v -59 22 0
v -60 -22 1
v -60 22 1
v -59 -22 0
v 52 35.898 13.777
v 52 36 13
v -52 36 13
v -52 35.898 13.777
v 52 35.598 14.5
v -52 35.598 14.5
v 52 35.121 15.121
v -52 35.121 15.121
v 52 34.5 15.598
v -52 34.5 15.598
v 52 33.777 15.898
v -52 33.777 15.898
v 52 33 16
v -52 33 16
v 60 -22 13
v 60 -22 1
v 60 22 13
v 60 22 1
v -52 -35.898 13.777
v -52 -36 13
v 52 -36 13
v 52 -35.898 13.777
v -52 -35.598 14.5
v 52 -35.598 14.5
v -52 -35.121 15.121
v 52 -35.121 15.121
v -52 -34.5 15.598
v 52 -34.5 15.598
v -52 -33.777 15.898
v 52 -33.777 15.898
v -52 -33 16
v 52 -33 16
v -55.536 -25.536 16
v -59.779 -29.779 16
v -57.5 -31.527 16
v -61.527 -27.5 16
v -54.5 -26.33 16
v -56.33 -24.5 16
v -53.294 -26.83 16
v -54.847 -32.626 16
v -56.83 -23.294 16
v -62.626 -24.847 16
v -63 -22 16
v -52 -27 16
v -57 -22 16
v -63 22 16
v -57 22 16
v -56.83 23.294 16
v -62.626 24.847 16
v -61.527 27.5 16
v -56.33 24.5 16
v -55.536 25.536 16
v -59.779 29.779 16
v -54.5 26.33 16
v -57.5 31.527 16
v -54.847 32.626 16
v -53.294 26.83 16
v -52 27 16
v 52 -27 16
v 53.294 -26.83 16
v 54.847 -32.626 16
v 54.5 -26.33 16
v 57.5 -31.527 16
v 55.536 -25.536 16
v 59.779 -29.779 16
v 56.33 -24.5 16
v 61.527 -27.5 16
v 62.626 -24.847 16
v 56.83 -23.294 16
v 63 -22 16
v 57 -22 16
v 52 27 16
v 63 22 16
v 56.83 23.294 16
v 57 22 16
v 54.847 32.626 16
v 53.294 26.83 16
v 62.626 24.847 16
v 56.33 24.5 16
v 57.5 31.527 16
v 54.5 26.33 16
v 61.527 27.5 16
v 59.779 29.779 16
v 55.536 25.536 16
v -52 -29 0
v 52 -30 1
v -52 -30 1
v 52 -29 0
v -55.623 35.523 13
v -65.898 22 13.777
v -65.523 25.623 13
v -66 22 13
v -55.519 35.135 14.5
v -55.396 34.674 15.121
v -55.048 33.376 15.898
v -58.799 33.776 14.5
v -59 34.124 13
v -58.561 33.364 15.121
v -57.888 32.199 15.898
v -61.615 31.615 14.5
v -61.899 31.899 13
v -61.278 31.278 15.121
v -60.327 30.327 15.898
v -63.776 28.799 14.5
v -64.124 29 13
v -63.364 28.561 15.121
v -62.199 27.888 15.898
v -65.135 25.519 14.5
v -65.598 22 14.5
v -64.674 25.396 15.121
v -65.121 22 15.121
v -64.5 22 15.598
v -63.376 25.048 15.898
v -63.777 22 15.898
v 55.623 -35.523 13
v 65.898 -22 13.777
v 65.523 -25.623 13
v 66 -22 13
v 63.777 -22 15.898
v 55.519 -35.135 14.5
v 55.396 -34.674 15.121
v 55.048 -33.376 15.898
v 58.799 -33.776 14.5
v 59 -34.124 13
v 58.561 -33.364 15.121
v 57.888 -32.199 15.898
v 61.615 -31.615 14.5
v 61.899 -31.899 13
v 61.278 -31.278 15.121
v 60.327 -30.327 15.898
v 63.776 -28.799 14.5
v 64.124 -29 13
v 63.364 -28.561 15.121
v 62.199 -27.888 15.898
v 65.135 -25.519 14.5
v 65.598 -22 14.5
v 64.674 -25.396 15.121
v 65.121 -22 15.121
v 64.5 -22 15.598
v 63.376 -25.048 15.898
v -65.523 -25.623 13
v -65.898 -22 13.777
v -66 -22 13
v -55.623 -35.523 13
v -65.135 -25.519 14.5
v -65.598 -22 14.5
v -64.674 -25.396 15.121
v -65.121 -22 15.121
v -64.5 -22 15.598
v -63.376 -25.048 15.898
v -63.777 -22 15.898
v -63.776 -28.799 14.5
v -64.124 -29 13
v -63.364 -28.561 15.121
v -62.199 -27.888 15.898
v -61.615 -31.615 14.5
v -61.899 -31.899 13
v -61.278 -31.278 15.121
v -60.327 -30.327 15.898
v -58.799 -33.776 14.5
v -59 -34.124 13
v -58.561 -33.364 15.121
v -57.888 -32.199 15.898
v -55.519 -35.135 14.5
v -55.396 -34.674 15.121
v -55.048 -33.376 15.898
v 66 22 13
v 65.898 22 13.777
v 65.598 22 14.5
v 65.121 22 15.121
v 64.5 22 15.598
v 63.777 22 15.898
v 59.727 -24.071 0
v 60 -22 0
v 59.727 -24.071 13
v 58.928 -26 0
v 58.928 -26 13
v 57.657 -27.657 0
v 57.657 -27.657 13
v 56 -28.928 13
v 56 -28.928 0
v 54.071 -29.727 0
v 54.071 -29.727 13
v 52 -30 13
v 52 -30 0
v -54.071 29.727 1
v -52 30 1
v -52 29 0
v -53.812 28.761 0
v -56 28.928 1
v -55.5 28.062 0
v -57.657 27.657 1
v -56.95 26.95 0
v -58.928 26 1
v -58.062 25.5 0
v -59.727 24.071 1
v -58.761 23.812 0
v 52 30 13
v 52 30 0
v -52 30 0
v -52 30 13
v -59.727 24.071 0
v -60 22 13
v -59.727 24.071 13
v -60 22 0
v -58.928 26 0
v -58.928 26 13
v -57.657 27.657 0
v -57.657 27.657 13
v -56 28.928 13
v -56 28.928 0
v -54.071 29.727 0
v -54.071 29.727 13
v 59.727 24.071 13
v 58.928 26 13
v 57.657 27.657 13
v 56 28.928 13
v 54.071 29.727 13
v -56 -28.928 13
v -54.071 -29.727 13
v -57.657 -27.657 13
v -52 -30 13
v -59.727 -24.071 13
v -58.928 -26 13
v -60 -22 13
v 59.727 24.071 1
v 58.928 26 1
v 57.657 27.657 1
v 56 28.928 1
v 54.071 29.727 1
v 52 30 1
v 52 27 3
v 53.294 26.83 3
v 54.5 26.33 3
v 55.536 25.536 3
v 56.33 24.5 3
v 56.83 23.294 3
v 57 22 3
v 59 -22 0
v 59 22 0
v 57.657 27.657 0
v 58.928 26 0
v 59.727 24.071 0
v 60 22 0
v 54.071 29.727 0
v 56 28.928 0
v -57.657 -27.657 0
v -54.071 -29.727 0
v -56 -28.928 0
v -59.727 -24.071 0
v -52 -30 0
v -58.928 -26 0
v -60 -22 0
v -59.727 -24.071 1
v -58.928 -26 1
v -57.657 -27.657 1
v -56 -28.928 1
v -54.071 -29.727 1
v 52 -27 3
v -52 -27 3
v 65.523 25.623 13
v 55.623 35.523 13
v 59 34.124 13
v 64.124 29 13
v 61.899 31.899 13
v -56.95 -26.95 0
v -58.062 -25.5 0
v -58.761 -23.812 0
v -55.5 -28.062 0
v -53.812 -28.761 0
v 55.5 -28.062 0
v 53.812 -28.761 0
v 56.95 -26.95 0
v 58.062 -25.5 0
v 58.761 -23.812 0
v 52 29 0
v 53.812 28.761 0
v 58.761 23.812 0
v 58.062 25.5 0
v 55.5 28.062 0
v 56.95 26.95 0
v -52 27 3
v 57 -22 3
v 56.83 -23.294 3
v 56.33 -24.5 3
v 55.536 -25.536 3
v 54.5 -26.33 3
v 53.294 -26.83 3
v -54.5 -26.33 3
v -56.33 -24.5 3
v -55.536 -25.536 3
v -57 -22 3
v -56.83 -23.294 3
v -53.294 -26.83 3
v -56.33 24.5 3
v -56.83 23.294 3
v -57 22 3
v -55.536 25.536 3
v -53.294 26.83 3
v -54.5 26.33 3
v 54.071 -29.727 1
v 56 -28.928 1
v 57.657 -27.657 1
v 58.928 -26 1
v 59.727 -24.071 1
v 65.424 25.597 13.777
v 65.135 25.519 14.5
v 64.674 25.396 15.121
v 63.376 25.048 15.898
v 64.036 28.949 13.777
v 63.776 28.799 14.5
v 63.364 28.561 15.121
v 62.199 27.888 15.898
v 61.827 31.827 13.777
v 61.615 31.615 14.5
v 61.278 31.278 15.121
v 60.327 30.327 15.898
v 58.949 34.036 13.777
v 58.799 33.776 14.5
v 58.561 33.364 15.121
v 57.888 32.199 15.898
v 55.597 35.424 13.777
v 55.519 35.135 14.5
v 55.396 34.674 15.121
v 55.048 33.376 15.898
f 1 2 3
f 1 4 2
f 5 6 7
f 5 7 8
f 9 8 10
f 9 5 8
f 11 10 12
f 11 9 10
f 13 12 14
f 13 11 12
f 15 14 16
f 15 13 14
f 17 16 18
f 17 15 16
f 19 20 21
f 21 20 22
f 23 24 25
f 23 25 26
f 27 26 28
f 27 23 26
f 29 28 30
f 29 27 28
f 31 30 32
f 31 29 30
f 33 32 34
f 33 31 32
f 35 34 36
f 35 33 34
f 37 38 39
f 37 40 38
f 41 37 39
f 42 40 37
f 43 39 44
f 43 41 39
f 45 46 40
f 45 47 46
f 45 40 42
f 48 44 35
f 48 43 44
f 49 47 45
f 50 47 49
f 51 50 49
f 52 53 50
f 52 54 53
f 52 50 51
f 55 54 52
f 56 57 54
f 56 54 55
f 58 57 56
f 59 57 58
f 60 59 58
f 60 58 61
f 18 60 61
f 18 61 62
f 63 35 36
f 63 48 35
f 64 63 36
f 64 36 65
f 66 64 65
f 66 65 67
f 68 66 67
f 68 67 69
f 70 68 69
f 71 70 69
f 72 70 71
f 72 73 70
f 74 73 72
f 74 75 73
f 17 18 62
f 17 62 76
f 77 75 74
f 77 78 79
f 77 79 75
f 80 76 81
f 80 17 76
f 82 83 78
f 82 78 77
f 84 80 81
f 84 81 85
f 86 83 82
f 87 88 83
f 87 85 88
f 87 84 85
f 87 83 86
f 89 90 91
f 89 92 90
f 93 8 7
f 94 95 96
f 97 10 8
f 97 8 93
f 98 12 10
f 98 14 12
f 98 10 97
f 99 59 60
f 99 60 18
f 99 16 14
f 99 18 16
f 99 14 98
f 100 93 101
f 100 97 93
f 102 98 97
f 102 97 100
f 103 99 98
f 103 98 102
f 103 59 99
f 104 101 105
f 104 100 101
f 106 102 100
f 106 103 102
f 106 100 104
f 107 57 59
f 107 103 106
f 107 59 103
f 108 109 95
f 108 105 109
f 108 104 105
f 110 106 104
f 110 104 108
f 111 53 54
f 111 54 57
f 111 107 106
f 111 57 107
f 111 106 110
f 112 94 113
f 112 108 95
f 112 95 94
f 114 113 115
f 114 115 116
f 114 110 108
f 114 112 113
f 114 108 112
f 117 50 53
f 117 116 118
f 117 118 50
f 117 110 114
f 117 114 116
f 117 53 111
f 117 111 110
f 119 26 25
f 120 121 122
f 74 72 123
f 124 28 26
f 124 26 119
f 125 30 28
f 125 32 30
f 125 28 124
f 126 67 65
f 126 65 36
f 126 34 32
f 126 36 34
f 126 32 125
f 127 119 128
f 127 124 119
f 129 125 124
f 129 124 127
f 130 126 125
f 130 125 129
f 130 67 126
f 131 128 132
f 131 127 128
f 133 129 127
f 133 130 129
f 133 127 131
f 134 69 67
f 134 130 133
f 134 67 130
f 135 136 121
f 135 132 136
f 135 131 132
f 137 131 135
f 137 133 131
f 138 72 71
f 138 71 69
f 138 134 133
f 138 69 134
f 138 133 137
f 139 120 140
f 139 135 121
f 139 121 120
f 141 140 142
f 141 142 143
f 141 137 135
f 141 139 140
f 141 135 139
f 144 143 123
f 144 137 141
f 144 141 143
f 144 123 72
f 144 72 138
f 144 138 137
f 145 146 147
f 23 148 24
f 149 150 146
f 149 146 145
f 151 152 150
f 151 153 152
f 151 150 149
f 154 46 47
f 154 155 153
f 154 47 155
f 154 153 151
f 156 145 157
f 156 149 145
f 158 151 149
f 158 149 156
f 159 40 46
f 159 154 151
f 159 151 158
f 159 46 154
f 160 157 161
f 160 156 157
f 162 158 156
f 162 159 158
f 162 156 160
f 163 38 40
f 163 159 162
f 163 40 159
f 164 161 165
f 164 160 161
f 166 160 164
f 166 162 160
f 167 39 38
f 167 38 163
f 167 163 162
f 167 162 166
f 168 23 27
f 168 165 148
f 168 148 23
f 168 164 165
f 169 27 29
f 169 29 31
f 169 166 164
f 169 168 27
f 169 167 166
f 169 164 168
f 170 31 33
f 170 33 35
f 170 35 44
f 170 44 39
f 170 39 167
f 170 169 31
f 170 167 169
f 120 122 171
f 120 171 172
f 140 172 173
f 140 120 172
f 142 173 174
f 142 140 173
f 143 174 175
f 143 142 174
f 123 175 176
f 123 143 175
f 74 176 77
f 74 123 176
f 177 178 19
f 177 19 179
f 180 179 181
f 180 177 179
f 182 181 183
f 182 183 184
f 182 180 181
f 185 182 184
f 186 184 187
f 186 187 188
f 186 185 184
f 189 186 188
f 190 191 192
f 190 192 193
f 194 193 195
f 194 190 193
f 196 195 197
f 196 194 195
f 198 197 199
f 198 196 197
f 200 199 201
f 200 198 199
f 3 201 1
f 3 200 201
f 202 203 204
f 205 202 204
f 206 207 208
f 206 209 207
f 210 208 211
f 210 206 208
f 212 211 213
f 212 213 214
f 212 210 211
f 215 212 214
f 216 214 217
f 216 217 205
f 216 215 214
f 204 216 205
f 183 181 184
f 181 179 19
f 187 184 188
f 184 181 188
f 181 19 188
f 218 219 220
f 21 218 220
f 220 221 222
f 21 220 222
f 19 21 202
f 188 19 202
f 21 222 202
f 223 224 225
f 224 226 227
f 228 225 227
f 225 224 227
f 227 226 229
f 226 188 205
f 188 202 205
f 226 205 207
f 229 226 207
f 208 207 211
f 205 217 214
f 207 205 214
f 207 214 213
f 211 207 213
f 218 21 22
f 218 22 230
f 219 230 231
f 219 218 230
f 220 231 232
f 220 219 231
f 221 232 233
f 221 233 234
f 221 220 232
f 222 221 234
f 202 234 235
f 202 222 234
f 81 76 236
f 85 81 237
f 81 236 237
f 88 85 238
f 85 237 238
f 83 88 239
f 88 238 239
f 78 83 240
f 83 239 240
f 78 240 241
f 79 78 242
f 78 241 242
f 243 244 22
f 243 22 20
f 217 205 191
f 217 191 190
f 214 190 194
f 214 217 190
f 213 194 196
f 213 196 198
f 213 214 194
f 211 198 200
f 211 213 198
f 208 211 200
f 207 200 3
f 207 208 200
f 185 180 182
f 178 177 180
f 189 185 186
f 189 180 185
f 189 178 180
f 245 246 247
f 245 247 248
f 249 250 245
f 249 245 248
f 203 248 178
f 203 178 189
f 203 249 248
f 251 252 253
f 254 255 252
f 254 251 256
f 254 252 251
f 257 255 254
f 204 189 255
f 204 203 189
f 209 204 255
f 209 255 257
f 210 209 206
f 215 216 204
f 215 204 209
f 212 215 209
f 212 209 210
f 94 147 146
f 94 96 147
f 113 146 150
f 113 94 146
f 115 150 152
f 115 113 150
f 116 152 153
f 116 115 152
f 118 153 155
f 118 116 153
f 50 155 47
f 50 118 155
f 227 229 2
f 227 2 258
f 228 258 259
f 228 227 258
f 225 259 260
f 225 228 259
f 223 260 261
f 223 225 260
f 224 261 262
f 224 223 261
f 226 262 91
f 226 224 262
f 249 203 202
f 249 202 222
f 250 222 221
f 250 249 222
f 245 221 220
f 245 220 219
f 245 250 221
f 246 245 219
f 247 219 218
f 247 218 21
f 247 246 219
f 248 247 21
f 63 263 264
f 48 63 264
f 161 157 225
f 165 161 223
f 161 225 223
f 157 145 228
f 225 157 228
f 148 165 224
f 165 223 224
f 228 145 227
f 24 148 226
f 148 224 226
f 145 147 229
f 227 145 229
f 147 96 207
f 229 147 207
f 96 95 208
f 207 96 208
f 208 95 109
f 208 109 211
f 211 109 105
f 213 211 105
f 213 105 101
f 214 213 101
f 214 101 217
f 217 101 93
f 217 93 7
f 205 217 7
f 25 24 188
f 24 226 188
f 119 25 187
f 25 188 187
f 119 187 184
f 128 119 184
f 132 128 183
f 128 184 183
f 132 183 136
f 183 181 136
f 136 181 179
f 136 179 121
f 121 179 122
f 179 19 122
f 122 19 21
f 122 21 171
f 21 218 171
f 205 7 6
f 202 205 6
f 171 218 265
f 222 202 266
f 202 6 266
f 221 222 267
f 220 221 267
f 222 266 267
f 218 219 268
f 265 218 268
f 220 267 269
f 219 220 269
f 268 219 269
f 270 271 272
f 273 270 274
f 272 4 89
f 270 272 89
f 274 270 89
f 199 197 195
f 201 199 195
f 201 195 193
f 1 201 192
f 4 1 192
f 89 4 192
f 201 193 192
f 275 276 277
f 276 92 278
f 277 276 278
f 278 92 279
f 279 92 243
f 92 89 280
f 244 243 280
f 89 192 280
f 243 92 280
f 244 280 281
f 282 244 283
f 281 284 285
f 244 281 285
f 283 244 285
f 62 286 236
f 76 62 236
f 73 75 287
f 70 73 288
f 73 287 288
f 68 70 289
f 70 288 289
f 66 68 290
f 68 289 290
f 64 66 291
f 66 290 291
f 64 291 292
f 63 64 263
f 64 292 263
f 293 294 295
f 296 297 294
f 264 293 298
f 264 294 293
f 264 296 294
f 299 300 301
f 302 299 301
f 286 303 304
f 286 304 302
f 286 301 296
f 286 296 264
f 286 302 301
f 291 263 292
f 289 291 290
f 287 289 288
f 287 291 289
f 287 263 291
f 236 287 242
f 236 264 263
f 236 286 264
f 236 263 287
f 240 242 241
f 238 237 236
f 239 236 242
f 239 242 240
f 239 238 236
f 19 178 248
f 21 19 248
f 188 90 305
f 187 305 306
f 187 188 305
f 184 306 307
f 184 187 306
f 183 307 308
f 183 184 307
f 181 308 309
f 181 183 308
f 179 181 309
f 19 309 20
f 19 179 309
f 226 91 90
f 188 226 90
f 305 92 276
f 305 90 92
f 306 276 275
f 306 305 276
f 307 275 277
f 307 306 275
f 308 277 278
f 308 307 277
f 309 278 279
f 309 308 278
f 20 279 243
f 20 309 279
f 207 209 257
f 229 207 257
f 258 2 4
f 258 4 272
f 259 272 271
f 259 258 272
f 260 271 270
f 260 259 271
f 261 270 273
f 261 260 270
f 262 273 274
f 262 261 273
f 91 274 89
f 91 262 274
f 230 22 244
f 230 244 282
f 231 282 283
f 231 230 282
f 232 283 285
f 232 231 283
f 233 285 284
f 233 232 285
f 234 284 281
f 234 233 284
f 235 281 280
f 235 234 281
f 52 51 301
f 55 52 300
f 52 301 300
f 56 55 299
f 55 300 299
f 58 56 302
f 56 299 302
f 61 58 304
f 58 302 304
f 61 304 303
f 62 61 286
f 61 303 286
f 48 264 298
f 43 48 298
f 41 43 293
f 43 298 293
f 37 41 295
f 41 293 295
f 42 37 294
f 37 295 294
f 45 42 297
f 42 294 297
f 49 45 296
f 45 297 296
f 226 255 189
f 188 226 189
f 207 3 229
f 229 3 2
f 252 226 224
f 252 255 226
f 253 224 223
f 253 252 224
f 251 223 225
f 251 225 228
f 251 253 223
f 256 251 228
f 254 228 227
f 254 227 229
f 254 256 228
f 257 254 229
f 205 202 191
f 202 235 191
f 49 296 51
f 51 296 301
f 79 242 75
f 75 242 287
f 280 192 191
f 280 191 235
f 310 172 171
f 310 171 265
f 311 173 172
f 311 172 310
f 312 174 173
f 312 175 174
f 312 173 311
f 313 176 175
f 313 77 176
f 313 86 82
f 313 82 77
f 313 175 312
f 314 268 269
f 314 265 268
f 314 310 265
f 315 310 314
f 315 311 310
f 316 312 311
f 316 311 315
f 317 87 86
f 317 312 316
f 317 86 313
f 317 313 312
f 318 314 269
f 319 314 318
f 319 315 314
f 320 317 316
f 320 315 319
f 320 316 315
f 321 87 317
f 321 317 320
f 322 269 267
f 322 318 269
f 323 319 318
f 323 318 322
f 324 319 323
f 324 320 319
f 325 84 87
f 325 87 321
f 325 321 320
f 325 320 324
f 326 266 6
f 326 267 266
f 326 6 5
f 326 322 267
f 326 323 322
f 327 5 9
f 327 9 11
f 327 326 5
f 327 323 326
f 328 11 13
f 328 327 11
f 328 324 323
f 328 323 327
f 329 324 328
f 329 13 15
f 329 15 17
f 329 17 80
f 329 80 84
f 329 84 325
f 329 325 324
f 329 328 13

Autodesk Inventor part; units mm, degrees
ref_plane "YZ Plane" through (0, 0, 0) normal (1, 0, 0) x (0, 1, 0)
ref_plane "XZ Plane" through (0, 0, 0) normal (0, 1, 0) x (-1, 0, 0)
ref_plane "XY Plane" through (0, 0, 0) normal (0, 0, 1) x (1, 0, 0)
sketch "Sketch1" plane through (0, 0, 0) normal (0, 0, 1) x (1, 0, 0)
  line L0 (-60, -30) -> (60, -30)
  line L1 (60, -30) -> (60, 30)
  line L2 (60, 30) -> (-60, 30)
  line L3 (-60, 30) -> (-60, -30)
  line L4 (-60, -30) -> (60, 30) construction
  line L5 (60, -30) -> (-60, 30) construction
  point P0 (0, 0)
extrude "Extrusion1" add sketch "Sketch1" along normal blind 13
fillet "Fillet1" radius 8 4 edges at (-60, -30, 6.5) (-60, 30, 6.5) (60, -30, 6.5) (60, 30, 6.5)
shell "Shell1" thickness 3 removed faces 1 at (17.3333, -10, 13)
sketch "Sketch2" plane through (0, 0, 13) normal (0, 0, 1) x (1, 0, 0)
  arc A0 (60, 22) -> (52, 30) centre (52, 22) ccw projected
  line L0 (52, 30) -> (-52, 30) projected
  arc A1 (-52, 30) -> (-60, 22) centre (-52, 22) ccw projected
  line L1 (-60, 22) -> (-60, -22) projected
  arc A2 (-60, -22) -> (-52, -30) centre (-52, -22) ccw projected
  line L2 (-52, -30) -> (52, -30) projected
  arc A3 (52, -30) -> (60, -22) centre (52, -22) ccw projected
  line L3 (60, -22) -> (60, 22) projected
  line L4 (-52, 36) -> (52, 36)
  arc A4 (66, 22) -> (52, 36) centre (52, 22) ccw
  line L5 (66, 22) -> (66, -22)
  arc A5 (52, -36) -> (66, -22) centre (52, -22) ccw
  line L6 (52, -36) -> (-52, -36)
  arc A6 (-66, -22) -> (-52, -36) centre (-52, -22) ccw
  line L7 (-66, -22) -> (-66, 22)
  arc A7 (-52, 36) -> (-66, 22) centre (-52, 22) ccw
  arc A8 (-52, 27) -> (-57, 22) centre (-52, 22) ccw projected
  line L8 (-52, 27) -> (52, 27) projected
  arc A9 (57, 22) -> (52, 27) centre (52, 22) ccw projected
  line L9 (57, 22) -> (57, -22) projected
  arc A10 (52, -27) -> (57, -22) centre (52, -22) ccw projected
  line L10 (52, -27) -> (-52, -27) projected
  arc A11 (-57, -22) -> (-52, -27) centre (-52, -22) ccw projected
  line L11 (-57, -22) -> (-57, 22) projected
  arc A12 (60, 22) -> (52, 30) centre (52, 22) ccw projected
  line L12 (52, 30) -> (-52, 30) projected
  arc A13 (-52, 30) -> (-60, 22) centre (-52, 22) ccw projected
  line L13 (-60, 22) -> (-60, -22) projected
  arc A14 (-60, -22) -> (-52, -30) centre (-52, -22) ccw projected
  line L14 (-52, -30) -> (52, -30) projected
  arc A15 (52, -30) -> (60, -22) centre (52, -22) ccw projected
  line L15 (60, -22) -> (60, 22) projected
  point P0 (0, 0)
  dimension "d5" = 6
extrude "Extrusion2" add sketch "Sketch2" along normal blind 3 contours L3 A3 L2 A2 L1 A1 L0 A0 | L4 A4 L5 A5 L6 A6 L7 A7
fillet "Fillet2" radius 3 8 edges at (-66, 0, 16) (-61.8995, -31.8995, 16) (0, -36, 16) (61.8995, -31.8995, 16) (66, 0, 16) (61.8995, 31.8995, 16) (0, 36, 16) (-61.8995, 31.8995, 16)
sketch "Sketch3" plane through (0, 0, 0) normal (0, 0, -1) x (-1, 0, 0)
  arc A0 (-52, 30) -> (-60, 22) centre (-52, 22) ccw projected
  line L0 (-60, -22) -> (-60, 22) projected
  arc A1 (-60, -22) -> (-52, -30) centre (-52, -22) ccw projected
  line L1 (52, -30) -> (-52, -30) projected
  arc A2 (52, -30) -> (60, -22) centre (52, -22) ccw projected
  line L2 (60, 22) -> (60, -22) projected
  arc A3 (60, 22) -> (52, 30) centre (52, 22) ccw projected
  line L3 (-52, 30) -> (52, 30) projected
  point P0 (0, 0)
chamfer "Chamfer1" distance 1 angle 45 8 edges at (-60, 0, 0) (-57.6569, -27.6569, 0) (0, -30, 0) (57.6569, -27.6569, 0) (60, 0, 0) (57.6569, 27.6569, 0) (0, 30, 0) (-57.6569, 27.6569, 0)
extrude "Extrusion3" add sketch "Sketch3" against normal up to surface (13 mm away) separate body
sketch "Sketch4" plane through (-52, 30, 13) normal (0, 0, 1) x (1, 0, 0)
  line L0 (112, -8) -> (112, -52) projected
  line L1 (0, 0) -> (104, 0) projected
  point P0 (52, -30)
  point P1 (112, -30)
  point P2 (52, 0)
equation "\"zzz\" = 1"
properties part number "Holder" material "Polycarbonate, Smoke"
